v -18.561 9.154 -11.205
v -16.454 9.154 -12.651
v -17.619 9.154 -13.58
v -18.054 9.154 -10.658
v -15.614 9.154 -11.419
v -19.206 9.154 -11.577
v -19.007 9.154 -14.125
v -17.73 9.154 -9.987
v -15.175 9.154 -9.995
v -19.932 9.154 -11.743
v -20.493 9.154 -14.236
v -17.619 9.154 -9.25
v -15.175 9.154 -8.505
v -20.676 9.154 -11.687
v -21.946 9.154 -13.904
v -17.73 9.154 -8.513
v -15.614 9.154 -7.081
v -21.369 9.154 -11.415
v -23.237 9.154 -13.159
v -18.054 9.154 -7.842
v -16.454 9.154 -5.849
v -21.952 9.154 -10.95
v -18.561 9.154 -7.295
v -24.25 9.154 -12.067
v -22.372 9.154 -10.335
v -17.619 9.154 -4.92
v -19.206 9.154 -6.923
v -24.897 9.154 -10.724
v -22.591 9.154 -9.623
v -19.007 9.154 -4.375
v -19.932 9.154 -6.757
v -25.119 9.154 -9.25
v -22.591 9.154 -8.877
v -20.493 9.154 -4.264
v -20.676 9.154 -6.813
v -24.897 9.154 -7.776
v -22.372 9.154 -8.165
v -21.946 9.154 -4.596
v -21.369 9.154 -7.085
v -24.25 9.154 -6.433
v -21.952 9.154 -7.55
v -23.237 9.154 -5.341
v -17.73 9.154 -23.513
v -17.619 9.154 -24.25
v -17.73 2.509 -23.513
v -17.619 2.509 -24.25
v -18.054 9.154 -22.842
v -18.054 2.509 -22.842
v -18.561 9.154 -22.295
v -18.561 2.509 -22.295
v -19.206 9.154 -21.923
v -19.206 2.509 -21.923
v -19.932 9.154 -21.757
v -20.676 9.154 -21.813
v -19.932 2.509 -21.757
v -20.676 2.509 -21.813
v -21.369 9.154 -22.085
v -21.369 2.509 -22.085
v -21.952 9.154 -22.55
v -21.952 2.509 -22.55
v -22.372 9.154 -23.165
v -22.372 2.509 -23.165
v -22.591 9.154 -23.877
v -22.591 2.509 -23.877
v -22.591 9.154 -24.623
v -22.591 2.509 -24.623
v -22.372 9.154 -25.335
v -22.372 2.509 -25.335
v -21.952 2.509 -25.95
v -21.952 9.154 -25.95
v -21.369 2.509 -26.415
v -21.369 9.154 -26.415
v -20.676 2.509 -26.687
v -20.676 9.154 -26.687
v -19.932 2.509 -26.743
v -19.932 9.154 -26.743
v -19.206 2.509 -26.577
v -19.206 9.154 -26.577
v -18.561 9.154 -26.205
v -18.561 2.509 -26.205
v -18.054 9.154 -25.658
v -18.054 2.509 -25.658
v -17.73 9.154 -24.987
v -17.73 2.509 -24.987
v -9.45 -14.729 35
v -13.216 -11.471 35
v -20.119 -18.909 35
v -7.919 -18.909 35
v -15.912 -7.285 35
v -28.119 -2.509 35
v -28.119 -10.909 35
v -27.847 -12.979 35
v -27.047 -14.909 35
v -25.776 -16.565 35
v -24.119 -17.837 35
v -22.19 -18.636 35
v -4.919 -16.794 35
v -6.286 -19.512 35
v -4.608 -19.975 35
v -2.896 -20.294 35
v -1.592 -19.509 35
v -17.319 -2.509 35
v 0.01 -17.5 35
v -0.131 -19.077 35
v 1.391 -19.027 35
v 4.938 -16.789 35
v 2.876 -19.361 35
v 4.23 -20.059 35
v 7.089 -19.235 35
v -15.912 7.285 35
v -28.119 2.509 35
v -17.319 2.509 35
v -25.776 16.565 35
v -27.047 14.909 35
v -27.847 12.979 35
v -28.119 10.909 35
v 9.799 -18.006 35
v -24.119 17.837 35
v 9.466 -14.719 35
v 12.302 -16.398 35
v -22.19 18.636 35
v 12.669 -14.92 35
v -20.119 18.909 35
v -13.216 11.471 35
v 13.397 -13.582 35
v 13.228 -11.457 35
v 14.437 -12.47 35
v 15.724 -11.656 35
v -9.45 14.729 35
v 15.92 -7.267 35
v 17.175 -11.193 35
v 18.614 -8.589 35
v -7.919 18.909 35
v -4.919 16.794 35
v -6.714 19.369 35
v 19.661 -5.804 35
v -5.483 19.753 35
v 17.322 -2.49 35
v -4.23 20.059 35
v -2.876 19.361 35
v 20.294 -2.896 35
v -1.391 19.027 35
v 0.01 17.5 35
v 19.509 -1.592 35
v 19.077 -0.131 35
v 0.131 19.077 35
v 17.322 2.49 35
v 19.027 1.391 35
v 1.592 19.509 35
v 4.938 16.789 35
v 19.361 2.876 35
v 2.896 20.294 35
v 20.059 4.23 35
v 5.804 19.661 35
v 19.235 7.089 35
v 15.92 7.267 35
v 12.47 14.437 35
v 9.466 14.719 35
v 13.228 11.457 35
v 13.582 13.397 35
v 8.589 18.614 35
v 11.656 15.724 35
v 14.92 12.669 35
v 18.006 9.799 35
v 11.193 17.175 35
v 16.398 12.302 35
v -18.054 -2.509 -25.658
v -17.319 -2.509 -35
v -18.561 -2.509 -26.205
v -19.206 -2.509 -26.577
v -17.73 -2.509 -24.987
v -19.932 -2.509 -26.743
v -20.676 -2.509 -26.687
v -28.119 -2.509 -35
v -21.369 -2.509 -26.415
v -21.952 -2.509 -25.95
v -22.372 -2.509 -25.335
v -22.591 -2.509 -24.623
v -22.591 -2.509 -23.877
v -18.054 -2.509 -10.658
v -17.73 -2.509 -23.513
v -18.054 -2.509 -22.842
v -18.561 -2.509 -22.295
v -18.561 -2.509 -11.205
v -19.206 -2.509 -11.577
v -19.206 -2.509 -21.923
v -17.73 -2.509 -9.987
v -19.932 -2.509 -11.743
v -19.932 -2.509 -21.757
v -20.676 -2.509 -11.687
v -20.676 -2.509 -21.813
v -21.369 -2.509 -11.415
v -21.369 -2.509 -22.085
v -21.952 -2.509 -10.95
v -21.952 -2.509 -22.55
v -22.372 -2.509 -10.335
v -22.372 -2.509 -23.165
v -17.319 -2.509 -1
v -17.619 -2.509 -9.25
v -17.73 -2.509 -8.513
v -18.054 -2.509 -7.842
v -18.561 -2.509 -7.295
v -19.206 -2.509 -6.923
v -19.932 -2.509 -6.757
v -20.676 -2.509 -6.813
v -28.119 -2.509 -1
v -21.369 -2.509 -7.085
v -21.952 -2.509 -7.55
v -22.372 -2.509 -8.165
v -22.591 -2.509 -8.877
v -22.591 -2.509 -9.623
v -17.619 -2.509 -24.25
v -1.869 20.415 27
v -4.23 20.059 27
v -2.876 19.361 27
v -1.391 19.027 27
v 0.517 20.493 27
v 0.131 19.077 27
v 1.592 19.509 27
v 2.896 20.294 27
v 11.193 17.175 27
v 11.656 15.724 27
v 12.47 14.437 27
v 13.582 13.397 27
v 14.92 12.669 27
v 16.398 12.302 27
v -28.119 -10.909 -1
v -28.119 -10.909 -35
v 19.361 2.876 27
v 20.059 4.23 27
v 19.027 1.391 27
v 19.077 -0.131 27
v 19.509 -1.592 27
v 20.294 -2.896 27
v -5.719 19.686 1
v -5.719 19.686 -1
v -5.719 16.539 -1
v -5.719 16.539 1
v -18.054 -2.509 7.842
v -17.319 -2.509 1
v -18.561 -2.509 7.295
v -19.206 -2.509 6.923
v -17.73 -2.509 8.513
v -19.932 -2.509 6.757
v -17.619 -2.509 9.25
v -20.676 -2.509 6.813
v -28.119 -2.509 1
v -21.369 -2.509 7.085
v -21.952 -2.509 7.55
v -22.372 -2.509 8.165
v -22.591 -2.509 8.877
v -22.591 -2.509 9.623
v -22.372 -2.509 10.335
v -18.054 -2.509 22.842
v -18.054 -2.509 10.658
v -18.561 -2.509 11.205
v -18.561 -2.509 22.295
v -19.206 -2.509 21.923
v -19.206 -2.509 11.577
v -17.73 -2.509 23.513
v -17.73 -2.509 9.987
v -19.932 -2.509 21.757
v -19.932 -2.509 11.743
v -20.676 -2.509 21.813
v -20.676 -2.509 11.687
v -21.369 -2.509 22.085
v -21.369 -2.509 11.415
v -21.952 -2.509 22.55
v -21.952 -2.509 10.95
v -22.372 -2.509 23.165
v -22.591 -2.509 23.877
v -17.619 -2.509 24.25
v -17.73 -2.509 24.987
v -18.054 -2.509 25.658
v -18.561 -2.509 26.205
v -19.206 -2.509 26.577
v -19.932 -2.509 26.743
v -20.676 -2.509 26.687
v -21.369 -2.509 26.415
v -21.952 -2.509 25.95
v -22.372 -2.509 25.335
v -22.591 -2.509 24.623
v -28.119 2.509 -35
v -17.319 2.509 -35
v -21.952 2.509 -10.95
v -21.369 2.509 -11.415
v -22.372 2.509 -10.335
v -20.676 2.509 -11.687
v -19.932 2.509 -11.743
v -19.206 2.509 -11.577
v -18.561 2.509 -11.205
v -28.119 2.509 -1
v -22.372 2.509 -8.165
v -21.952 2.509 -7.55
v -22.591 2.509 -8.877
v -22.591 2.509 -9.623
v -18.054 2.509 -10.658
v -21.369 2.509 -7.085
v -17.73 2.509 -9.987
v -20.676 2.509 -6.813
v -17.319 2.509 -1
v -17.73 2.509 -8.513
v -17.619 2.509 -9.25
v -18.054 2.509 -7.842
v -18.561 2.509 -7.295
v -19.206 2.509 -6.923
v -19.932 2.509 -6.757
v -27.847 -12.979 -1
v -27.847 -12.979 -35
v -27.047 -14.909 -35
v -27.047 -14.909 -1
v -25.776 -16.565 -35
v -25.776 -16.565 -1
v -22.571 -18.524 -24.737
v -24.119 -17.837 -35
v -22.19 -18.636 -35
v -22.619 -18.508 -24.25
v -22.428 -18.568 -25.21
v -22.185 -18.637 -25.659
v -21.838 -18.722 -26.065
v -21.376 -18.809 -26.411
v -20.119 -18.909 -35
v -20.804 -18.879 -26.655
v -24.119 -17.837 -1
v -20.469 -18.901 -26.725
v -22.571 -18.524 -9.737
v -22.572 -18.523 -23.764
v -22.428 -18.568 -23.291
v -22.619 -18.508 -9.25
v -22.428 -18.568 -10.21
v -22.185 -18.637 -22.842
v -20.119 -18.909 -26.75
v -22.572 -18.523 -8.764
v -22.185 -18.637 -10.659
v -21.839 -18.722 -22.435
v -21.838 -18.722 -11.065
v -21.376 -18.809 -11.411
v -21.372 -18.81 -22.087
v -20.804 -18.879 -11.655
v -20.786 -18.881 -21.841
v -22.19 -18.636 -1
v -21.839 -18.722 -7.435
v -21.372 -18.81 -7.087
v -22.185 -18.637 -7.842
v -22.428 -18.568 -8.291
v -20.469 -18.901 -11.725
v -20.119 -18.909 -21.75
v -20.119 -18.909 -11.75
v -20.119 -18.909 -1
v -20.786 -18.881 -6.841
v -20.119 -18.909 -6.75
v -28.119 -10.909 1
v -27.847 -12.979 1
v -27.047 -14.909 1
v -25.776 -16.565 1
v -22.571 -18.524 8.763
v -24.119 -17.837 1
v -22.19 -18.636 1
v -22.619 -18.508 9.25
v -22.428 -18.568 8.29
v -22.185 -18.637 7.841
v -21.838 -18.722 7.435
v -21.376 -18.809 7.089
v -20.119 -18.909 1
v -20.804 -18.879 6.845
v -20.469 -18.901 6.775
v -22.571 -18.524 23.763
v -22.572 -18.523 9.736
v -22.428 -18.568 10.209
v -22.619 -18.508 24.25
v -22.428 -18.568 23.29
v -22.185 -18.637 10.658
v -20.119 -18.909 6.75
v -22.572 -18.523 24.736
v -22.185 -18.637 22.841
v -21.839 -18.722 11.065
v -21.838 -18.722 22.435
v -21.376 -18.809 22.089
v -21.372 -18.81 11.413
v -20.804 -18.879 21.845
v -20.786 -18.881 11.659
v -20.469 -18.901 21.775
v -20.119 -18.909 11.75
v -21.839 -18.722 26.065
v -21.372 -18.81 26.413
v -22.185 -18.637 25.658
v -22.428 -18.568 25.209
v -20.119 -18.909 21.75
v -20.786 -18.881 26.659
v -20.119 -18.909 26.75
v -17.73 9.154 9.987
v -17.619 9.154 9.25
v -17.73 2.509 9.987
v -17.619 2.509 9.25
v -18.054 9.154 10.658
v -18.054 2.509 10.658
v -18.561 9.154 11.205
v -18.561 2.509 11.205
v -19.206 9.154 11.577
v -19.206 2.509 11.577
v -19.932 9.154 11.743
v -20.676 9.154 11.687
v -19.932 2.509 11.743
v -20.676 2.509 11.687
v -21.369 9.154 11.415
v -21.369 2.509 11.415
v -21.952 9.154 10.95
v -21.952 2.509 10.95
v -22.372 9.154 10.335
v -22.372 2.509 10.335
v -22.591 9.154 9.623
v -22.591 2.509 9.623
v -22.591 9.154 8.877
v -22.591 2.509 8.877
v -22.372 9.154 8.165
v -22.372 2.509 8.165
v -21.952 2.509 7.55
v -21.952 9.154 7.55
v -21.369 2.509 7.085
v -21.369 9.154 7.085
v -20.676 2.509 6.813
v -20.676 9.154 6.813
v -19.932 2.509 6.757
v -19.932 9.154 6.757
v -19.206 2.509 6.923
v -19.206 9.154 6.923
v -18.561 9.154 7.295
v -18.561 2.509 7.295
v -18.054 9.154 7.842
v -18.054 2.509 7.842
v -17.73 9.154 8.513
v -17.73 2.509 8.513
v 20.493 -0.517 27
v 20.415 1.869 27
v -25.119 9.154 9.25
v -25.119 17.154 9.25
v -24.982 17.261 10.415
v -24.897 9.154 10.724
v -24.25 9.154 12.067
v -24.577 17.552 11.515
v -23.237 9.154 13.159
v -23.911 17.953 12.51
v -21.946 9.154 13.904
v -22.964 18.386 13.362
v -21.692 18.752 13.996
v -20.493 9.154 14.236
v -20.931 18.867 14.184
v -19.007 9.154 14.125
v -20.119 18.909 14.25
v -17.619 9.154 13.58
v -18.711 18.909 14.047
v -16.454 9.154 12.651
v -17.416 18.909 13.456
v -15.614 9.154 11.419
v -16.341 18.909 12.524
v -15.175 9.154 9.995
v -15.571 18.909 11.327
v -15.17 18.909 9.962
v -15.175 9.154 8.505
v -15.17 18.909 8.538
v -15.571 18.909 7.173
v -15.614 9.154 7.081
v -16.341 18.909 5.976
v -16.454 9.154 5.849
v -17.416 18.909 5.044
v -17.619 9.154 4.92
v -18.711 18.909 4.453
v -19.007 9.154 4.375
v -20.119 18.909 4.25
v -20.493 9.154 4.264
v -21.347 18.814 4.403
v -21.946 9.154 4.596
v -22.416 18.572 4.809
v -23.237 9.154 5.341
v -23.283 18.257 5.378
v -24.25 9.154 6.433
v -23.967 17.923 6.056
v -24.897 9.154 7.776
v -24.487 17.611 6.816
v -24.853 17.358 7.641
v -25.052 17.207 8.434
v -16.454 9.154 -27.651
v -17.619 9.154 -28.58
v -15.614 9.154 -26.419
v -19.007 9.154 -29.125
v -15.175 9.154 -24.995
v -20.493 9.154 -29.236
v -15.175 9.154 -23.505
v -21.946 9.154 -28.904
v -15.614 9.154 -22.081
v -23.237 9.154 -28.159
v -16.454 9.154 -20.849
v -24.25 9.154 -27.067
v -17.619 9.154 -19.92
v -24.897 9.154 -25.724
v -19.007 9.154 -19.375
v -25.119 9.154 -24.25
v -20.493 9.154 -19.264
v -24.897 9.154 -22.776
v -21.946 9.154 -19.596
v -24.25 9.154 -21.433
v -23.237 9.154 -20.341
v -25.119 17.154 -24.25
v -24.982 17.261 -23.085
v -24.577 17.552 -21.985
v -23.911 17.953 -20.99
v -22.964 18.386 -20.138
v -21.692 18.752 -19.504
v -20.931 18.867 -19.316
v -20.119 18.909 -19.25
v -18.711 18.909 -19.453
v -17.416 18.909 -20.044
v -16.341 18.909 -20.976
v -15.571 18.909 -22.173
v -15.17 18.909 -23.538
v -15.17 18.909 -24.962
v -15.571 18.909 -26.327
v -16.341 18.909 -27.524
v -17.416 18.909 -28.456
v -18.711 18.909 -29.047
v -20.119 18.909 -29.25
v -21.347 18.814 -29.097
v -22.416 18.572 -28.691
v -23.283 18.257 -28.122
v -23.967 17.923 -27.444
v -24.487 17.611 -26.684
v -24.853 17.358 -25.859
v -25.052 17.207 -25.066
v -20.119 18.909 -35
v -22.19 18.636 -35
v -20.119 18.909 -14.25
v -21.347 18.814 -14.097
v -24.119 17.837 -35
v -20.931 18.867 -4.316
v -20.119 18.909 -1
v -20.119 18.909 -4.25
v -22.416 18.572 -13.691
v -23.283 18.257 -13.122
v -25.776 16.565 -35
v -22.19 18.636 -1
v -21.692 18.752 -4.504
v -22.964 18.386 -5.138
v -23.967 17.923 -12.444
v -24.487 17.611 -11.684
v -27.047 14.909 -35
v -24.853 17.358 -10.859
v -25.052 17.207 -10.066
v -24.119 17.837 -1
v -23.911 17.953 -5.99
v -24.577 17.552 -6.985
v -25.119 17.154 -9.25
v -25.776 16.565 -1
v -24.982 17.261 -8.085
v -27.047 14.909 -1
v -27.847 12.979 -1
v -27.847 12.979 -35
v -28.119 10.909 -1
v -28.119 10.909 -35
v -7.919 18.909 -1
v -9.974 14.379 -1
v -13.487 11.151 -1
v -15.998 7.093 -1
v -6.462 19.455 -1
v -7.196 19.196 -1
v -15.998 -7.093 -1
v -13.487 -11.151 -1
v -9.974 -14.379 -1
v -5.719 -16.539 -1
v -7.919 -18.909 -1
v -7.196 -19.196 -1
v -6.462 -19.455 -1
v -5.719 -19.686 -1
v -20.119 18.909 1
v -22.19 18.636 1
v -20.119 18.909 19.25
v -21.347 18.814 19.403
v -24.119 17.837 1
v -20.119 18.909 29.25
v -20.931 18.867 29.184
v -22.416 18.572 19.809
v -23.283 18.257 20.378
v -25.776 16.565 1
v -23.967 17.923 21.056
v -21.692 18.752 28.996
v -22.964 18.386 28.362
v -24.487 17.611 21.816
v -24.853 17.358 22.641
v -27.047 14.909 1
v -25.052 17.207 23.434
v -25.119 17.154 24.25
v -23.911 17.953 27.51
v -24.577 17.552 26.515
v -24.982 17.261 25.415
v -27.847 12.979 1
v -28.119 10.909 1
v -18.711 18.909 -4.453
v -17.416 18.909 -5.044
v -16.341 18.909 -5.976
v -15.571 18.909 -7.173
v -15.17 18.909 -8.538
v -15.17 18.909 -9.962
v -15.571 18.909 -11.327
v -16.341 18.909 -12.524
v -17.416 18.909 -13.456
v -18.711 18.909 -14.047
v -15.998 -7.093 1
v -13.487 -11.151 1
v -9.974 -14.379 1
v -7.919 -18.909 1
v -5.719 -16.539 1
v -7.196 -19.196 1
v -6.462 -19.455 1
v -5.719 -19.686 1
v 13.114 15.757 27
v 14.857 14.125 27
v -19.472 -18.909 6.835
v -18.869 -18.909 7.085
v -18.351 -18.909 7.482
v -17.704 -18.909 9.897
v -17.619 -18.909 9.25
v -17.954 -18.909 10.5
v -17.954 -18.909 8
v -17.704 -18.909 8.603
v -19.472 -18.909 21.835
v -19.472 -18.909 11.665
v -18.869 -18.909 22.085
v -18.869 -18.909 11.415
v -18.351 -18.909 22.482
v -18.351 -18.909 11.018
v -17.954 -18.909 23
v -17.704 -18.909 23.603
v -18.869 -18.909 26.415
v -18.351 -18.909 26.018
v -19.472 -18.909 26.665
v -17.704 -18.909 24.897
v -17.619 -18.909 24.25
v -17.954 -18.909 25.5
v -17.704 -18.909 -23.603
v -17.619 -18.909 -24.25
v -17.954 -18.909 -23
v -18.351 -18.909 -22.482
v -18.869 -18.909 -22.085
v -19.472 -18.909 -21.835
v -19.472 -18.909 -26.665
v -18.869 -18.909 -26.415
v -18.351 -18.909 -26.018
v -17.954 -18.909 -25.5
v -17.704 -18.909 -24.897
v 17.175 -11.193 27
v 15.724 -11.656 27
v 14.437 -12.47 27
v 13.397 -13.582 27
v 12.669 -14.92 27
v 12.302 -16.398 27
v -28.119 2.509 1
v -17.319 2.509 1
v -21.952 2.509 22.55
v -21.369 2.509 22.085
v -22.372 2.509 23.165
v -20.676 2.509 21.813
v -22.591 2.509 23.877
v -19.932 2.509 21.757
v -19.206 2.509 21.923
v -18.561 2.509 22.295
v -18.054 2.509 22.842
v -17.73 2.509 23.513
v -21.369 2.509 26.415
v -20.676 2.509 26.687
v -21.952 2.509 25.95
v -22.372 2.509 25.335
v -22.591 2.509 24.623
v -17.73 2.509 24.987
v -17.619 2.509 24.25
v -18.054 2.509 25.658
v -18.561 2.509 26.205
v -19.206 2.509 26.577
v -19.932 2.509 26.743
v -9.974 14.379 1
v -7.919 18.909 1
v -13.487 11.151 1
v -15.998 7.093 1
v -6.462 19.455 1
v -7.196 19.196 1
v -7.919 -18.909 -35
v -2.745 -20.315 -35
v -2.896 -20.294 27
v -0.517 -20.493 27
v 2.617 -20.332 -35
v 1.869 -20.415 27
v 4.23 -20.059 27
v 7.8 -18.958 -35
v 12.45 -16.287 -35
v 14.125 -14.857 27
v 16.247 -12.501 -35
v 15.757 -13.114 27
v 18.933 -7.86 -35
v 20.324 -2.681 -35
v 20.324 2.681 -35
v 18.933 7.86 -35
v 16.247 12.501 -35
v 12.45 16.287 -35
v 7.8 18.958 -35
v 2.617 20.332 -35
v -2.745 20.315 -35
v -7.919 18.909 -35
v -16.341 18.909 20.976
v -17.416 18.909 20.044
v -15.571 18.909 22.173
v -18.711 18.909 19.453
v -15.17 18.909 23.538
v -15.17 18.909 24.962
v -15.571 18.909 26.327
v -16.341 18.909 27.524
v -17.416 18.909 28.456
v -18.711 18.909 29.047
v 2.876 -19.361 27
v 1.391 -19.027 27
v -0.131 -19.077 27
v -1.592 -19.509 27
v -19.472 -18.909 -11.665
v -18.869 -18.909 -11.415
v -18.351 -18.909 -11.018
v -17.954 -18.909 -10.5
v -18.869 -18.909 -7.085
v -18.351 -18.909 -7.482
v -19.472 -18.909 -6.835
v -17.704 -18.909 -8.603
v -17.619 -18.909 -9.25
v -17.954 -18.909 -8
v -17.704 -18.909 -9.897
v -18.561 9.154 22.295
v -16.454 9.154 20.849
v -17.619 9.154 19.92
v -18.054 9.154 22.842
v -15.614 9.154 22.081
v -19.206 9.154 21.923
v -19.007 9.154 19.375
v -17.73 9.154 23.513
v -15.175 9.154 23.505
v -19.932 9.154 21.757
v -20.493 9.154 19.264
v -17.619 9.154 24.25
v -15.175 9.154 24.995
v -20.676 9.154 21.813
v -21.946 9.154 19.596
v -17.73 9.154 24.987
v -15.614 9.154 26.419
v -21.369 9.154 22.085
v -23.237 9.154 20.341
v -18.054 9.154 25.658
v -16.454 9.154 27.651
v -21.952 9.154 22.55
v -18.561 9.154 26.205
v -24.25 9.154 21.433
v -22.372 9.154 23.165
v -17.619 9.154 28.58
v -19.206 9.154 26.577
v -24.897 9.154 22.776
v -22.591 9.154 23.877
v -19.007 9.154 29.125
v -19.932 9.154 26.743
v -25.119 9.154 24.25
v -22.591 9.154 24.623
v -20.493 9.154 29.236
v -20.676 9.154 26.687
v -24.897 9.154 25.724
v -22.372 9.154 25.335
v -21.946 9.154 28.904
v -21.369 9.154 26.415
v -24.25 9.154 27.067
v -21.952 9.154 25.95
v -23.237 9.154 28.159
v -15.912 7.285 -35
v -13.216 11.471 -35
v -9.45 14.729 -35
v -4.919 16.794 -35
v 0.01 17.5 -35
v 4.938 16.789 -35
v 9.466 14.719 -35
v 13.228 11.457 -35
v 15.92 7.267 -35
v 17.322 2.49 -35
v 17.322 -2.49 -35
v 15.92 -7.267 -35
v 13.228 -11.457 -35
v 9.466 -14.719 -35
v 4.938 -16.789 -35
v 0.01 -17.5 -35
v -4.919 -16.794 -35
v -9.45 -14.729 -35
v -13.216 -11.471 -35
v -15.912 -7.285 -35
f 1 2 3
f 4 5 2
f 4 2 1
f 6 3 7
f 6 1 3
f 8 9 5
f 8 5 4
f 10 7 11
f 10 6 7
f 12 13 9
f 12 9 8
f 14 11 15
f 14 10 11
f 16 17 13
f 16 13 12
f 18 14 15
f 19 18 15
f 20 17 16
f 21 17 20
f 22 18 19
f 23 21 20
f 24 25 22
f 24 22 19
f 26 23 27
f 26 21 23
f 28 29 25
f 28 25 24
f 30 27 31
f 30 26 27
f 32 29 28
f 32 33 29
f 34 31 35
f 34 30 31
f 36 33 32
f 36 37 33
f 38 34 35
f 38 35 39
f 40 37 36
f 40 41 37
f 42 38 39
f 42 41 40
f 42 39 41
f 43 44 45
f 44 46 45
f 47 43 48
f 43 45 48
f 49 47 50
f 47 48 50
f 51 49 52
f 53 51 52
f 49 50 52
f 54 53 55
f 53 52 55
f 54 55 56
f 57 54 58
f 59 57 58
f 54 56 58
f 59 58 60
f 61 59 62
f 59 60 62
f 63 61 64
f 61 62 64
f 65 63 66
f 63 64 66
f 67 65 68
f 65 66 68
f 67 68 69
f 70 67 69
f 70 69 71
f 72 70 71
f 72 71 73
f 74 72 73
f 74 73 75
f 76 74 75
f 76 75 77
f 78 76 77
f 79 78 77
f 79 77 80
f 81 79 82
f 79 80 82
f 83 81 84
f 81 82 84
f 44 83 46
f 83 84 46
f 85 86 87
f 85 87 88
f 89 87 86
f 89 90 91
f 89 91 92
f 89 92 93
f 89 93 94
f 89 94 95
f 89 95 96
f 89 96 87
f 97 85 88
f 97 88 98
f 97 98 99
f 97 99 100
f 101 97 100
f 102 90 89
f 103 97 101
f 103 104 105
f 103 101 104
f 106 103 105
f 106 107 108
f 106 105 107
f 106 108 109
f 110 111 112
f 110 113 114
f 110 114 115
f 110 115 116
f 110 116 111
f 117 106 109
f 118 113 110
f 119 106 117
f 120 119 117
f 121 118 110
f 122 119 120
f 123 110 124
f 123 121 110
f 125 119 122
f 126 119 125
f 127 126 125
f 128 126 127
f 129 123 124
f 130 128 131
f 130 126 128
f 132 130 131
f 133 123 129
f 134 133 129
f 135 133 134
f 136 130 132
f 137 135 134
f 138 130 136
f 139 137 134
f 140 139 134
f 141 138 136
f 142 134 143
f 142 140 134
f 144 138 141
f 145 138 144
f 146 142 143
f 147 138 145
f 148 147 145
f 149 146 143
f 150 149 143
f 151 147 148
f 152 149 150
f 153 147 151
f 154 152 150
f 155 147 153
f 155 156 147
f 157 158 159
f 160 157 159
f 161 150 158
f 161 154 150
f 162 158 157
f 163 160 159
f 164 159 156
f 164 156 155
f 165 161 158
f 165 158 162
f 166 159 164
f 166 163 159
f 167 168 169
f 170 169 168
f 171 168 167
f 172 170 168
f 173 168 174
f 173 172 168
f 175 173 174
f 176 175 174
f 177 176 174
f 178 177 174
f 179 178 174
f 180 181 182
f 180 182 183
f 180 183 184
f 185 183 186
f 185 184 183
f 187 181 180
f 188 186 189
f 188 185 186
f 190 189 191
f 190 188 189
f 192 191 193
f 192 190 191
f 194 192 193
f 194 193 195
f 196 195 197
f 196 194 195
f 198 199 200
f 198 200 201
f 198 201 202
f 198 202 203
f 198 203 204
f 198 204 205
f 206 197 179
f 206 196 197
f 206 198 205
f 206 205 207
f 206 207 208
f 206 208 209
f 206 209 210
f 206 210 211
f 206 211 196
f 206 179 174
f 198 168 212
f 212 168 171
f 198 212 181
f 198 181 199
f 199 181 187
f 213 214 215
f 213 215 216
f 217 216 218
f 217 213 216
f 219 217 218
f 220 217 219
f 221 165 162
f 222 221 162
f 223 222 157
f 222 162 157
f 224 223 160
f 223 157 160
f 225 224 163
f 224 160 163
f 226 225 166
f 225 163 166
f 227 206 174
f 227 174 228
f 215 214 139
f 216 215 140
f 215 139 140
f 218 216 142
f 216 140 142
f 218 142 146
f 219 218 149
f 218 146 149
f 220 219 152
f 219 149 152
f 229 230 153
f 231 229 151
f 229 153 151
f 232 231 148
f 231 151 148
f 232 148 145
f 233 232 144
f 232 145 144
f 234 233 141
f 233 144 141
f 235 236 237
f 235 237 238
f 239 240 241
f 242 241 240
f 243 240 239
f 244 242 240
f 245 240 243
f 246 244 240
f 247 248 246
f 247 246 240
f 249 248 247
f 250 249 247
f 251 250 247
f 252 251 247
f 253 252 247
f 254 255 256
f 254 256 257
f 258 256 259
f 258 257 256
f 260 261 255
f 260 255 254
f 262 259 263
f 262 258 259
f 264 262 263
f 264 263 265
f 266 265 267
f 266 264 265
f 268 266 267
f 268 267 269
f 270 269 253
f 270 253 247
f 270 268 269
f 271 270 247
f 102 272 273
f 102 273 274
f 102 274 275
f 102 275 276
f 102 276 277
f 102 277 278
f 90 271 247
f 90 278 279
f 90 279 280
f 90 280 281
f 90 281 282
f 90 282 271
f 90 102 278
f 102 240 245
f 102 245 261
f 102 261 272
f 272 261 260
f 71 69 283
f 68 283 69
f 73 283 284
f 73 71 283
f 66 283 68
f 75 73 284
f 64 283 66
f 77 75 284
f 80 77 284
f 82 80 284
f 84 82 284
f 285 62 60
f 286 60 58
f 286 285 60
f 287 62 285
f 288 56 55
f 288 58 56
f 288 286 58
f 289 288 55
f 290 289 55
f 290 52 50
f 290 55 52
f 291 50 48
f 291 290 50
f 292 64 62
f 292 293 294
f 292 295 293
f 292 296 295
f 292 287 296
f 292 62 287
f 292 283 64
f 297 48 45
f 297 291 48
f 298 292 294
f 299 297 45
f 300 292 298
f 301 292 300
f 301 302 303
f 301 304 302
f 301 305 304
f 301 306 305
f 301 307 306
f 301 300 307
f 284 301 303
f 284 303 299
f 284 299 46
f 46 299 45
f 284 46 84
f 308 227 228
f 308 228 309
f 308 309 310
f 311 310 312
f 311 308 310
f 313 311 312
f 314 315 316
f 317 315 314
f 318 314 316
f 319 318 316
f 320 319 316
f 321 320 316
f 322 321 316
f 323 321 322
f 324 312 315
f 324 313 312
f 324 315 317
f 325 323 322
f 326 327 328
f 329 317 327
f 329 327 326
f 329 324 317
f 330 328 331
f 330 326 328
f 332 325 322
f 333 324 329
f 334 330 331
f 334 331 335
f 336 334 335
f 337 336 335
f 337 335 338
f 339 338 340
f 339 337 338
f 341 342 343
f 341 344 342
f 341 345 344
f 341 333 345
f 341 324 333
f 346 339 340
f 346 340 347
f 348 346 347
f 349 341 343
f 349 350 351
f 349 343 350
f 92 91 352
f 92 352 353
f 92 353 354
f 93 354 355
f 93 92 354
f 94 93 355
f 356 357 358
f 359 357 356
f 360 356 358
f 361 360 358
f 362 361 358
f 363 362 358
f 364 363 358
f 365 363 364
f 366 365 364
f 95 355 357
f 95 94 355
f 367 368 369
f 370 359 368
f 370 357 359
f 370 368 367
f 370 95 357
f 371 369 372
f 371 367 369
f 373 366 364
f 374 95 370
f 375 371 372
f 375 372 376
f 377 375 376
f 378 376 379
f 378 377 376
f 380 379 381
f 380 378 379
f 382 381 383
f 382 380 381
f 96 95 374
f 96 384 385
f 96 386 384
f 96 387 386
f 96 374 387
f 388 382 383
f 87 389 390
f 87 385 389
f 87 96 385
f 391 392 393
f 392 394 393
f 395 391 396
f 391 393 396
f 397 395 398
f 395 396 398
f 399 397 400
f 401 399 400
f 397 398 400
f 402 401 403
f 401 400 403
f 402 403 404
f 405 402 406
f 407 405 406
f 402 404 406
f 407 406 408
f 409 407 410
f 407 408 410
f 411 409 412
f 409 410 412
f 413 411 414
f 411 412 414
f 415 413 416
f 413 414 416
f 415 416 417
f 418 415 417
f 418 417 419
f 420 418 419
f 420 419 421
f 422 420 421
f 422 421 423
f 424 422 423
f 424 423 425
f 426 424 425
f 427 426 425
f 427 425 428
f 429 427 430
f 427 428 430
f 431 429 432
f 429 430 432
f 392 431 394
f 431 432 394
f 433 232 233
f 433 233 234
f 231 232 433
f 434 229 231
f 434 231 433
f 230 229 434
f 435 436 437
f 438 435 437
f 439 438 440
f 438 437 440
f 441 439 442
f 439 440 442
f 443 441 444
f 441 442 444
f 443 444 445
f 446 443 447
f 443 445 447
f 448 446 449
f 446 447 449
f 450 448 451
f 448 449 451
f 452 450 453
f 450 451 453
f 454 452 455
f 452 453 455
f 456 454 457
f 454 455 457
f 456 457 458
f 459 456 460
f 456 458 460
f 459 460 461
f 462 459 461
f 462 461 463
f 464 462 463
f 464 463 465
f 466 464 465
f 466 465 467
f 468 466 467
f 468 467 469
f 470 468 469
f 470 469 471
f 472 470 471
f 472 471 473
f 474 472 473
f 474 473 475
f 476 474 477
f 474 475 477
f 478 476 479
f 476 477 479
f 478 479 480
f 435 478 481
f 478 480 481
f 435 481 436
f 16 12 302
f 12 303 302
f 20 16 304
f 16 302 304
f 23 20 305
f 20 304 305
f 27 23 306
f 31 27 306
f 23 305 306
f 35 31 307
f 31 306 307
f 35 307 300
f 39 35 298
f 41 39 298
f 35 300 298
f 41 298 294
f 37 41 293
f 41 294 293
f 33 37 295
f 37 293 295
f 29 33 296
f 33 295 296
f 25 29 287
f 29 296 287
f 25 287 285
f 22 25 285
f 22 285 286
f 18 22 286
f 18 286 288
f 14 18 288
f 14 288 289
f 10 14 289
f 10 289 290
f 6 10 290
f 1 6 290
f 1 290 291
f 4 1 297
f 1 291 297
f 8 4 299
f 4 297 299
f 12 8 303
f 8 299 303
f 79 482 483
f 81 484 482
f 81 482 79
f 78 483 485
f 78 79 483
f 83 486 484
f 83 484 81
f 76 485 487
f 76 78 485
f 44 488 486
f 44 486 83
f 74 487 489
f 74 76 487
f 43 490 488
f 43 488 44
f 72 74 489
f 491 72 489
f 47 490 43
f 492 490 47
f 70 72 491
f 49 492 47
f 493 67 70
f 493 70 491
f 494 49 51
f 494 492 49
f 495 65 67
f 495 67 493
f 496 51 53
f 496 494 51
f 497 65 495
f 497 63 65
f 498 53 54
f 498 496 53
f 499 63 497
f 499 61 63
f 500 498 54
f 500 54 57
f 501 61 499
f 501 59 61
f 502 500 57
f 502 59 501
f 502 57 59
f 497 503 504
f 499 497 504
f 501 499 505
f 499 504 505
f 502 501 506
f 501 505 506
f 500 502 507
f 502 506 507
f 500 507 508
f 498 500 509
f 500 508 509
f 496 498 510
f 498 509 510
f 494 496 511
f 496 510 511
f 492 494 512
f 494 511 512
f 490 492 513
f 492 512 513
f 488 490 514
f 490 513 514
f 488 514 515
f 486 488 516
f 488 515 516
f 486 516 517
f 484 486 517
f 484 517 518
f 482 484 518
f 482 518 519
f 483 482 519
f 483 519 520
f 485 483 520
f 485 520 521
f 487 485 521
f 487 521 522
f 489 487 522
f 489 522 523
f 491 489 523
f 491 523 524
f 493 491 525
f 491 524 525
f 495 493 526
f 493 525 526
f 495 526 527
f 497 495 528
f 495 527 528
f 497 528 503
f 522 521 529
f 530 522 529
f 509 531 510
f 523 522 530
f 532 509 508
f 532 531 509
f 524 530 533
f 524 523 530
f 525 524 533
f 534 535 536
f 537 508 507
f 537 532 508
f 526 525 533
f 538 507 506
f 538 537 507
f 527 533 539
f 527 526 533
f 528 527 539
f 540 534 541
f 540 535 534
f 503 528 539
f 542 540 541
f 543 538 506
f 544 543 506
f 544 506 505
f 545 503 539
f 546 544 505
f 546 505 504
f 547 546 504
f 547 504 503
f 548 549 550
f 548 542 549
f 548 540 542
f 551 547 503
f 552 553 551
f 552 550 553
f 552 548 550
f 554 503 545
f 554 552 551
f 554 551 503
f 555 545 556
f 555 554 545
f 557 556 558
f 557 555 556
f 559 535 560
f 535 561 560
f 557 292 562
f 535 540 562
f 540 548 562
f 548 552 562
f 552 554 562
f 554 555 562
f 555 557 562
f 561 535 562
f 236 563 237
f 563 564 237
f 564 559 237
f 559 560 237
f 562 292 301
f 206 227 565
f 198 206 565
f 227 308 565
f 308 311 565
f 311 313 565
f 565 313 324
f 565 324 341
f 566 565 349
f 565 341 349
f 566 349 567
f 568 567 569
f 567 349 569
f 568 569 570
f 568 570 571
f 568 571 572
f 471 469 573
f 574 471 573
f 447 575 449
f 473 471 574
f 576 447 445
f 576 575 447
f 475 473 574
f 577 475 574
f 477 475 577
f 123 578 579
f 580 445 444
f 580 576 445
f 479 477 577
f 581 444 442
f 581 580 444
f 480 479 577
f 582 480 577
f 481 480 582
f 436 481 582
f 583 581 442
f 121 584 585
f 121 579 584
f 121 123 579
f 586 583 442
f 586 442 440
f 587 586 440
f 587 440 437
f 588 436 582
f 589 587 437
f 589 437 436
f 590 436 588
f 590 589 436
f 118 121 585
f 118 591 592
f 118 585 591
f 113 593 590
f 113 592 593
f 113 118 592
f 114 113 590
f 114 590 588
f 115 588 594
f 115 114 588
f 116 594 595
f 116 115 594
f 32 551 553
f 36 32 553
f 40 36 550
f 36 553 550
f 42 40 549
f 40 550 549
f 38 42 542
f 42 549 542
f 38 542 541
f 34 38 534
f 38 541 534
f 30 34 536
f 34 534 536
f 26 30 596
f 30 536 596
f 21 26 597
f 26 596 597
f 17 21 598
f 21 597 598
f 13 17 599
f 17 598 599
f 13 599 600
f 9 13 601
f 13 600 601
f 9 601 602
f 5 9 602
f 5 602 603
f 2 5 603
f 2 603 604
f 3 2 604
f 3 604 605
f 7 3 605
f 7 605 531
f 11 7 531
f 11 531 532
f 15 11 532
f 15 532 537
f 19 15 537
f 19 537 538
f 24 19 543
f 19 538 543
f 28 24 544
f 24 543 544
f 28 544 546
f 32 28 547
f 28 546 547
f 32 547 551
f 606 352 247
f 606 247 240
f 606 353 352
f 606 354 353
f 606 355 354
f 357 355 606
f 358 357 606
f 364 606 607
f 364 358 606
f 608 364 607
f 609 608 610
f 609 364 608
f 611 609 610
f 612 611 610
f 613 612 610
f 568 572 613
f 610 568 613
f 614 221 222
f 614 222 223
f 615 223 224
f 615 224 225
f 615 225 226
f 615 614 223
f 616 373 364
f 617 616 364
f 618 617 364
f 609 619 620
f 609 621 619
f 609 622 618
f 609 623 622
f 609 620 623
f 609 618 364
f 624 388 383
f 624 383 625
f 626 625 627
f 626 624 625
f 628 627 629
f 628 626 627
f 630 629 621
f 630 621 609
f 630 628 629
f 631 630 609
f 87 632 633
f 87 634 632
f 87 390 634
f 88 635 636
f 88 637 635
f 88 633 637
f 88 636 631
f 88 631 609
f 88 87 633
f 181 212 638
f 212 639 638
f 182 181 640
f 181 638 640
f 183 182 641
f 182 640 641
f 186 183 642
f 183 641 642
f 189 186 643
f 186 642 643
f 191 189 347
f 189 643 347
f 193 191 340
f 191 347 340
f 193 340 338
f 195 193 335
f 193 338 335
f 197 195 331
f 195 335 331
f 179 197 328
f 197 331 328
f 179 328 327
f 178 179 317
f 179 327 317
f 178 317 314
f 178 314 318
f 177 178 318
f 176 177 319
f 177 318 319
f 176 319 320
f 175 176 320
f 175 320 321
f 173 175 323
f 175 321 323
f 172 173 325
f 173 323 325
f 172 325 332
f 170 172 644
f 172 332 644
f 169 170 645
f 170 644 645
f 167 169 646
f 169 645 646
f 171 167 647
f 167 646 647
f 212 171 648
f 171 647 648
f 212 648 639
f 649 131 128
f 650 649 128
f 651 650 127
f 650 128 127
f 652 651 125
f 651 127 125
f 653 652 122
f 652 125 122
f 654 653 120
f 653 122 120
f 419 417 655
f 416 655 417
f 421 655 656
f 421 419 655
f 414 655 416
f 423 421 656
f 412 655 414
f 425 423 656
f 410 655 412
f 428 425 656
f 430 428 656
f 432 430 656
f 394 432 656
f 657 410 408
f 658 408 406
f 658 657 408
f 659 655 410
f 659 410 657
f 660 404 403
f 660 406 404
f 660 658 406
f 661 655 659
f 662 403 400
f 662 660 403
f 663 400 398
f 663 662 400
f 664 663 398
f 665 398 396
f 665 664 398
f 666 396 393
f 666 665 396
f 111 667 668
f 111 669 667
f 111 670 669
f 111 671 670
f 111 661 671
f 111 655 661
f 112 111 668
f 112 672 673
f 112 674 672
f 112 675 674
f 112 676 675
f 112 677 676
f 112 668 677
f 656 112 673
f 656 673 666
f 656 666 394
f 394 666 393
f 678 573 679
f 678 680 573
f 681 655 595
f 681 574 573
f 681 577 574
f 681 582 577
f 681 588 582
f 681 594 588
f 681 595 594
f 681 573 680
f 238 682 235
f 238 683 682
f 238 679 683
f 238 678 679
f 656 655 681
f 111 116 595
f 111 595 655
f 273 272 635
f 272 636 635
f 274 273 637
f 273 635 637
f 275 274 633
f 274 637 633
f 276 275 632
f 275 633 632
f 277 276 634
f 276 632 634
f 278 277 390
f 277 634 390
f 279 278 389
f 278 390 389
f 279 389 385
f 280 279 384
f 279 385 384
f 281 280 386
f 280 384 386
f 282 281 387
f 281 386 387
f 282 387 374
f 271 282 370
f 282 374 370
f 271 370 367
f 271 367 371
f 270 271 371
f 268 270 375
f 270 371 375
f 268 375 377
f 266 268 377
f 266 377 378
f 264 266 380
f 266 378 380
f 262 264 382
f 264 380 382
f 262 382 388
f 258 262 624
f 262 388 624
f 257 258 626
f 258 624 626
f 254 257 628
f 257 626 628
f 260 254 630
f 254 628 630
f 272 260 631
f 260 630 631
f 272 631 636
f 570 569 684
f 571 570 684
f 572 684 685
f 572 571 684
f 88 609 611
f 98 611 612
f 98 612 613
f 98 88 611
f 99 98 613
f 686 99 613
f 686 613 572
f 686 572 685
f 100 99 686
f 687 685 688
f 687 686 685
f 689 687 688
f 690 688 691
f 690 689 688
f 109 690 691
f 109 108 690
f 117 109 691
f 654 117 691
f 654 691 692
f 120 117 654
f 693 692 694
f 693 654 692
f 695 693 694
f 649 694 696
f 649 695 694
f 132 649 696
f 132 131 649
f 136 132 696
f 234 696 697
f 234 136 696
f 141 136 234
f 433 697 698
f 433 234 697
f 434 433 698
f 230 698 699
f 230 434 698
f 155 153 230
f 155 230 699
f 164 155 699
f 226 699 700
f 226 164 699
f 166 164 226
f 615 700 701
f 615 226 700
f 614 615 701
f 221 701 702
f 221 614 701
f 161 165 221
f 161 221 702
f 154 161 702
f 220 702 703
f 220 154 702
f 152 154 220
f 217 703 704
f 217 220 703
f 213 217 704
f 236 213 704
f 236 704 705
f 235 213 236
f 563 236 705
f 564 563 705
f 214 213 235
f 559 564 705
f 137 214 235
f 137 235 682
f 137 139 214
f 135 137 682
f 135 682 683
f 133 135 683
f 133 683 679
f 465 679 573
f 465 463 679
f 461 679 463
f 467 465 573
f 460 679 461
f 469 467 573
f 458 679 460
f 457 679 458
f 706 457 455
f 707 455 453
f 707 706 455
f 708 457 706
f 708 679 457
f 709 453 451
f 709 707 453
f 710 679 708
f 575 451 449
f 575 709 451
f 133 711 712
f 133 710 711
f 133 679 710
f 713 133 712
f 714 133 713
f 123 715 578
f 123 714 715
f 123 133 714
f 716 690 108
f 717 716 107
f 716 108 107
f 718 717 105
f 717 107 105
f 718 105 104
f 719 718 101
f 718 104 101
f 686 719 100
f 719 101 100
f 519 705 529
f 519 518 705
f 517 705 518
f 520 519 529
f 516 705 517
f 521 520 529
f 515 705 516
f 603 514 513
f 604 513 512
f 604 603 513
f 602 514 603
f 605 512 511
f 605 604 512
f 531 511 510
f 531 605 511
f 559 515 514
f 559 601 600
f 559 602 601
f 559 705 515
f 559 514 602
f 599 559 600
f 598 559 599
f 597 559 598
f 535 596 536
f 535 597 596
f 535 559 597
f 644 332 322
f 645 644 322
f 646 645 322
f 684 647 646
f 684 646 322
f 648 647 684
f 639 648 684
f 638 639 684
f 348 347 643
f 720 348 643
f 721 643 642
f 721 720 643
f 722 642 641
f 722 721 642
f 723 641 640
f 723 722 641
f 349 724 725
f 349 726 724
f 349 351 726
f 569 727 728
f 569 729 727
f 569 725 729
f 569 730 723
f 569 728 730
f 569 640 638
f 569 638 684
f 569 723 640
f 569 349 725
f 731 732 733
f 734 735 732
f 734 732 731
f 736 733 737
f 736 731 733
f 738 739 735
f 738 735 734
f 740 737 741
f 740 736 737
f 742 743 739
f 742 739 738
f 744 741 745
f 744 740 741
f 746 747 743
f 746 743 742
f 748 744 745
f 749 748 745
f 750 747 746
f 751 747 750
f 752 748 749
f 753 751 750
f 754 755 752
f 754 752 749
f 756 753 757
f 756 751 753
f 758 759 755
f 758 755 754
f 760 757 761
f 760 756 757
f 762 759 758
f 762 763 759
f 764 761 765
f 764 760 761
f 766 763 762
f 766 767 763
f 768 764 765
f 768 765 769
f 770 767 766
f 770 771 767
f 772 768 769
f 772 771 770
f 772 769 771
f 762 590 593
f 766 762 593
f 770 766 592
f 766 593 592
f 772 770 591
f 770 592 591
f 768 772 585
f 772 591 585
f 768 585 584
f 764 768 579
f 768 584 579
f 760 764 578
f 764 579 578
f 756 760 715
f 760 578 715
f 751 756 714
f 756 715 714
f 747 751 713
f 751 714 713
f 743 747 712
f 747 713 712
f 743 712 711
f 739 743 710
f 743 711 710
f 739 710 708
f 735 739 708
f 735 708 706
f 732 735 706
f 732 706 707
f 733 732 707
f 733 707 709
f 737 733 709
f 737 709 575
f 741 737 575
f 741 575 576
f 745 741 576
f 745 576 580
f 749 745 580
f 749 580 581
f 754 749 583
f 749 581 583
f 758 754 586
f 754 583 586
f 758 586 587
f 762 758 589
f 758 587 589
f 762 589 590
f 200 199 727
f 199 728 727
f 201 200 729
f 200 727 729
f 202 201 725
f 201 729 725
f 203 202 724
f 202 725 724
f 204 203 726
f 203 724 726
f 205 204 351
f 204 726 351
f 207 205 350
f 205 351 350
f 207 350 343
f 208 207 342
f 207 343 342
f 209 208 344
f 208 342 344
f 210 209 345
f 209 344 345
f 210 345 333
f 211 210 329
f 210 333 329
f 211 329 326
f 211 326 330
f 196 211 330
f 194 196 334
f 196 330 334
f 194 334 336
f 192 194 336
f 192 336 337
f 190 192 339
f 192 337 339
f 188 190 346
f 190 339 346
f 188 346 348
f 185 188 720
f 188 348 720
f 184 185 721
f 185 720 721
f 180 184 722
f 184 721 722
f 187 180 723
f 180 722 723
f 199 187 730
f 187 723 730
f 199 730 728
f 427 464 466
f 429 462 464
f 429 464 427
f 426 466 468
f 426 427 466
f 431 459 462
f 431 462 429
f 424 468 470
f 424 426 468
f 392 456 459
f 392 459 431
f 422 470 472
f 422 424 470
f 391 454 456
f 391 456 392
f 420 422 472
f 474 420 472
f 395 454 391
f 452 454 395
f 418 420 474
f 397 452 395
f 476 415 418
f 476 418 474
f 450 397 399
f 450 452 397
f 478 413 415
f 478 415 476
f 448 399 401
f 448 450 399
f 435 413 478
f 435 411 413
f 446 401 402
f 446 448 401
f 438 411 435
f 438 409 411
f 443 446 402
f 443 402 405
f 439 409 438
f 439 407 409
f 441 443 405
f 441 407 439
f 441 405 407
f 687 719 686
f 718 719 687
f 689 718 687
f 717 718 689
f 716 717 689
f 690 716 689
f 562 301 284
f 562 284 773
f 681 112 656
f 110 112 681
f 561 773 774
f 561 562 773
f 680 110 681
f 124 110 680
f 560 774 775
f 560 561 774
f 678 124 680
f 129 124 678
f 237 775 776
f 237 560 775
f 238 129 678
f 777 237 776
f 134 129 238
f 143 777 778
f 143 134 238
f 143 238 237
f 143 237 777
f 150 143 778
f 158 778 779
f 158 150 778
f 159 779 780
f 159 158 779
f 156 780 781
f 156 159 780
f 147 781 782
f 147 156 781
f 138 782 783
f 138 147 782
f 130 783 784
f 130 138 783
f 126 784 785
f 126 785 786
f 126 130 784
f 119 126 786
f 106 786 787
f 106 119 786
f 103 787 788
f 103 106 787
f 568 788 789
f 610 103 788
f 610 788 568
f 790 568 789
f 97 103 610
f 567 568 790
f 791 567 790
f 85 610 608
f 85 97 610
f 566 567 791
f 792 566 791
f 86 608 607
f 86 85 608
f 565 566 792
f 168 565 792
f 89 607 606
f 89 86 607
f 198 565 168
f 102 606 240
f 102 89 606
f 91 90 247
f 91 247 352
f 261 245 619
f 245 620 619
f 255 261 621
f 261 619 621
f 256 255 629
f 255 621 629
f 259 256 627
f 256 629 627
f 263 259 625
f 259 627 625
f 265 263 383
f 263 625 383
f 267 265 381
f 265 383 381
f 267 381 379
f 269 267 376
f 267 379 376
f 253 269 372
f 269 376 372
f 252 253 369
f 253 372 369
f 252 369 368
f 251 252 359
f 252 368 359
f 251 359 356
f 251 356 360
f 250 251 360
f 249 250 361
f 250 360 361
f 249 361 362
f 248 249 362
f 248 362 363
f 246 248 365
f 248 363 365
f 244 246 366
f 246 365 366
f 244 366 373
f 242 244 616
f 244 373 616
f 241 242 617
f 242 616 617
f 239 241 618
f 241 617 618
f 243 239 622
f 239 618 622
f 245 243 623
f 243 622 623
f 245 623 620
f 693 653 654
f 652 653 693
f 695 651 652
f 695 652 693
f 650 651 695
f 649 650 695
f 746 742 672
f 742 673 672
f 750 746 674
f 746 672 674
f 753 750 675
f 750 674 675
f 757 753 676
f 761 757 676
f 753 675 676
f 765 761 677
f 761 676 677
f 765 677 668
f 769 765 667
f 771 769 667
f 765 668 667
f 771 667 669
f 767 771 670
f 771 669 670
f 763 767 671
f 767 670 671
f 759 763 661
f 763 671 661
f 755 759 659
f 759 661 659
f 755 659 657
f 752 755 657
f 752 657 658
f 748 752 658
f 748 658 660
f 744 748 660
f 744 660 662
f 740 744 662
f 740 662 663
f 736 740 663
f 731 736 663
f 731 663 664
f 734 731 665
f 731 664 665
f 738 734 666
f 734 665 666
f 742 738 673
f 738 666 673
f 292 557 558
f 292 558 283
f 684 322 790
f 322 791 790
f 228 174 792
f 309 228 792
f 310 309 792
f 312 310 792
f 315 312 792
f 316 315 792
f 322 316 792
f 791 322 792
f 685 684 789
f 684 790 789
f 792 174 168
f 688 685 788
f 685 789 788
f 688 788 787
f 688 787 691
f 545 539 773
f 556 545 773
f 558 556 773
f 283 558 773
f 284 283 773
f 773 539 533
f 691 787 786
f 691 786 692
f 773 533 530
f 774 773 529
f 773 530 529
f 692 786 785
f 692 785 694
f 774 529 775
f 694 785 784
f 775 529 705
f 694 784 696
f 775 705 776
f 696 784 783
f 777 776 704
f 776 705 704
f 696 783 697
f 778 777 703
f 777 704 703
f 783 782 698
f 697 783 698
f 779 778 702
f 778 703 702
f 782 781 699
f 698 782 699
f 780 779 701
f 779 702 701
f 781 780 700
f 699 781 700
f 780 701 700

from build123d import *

# Parameters (mm, degrees)
F1_DEPTH       = 35
F3_D           = 5
F3_START       = 1.7550021
F3_CBORE_D     = 10
F3_CBORE_DEPTH = 8
F4_W           = 22.4
F4_H           = 2
F5_DEPTH       = 25
F6_R           = 6
F7_DEPTH       = 8


with BuildPart() as f1:
    # F0 (on Top) → F1 (new body, symmetric)
    with BuildSketch(Plane.XY):
        with BuildLine():
            ThreePointArc((-17.3192642082, 2.5086026559), (17.5, 0), (-17.3192642082, -2.5086026559))
            Line((-17.3192642082, -2.5086026559), (-20.3459311096, -2.5086026559))
            ThreePointArc((-20.3459311096, -2.5086026559), (-16.3392263155, -12.3806172468), (-7.9192642082, -18.9086026559))
            ThreePointArc((-7.9192642082, -18.9086026559), (20.5, 0), (-7.9192642082, 18.9086026559))
            Line((-7.9192642082, 18.9086026559), (-20.1192642082, 18.9086026559))
            ThreePointArc((-20.1192642082, 18.9086026559), (-25.7761184577, 16.5654569054), (-28.1192642082, 10.9086026559))
            Line((-28.1192642082, 10.9086026559), (-28.1192642082, 2.5086026559))
            Line((-28.1192642082, 2.5086026559), (-17.3192642082, 2.5086026559))
        make_face()
        with BuildLine():
            ThreePointArc((-7.9192642082, -18.9086026559), (-16.3392263155, -12.3806172468), (-20.3459311096, -2.5086026559))
            Line((-20.3459311096, -2.5086026559), (-28.1192642082, -2.5086026559))
            Line((-28.1192642082, -2.5086026559), (-28.1192642082, -10.9086026559))
            ThreePointArc((-28.1192642082, -10.9086026559), (-25.7761184577, -16.5654569054), (-20.1192642082, -18.9086026559))
            Line((-20.1192642082, -18.9086026559), (-7.9192642082, -18.9086026559))
        make_face()
    extrude(amount=F1_DEPTH, both=True)

    # F3 (through all)
    # its depths count from where the whole tool has entered the part; down to there all is cleared
    with Locations(Plane(origin=(0, 18.9086026559, 0), x_dir=(-1, 0, 0), z_dir=(0, 1, 0)).offset(-F3_START)):
        with Locations((20.1192642082, 24.25), (20.1192642082, 9.25), (20.1192642082, -9.25), (20.1192642082, -24.25)):
            CounterBoreHole(F3_D / 2, F3_CBORE_D / 2, F3_CBORE_DEPTH)

    # F4 (on Front) → F5 (cut, symmetric)
    with BuildSketch(Plane.XZ):
        with Locations((-16.9192642082, 0)):
            Rectangle(F4_W, F4_H)
    extrude(amount=F5_DEPTH, both=True, mode=Mode.SUBTRACT)

    # F6 (on face) → F7 (cut)
    with BuildSketch(Plane.XY.offset(35)):
        with Locations((0.8263058844, -25)):
            Circle(F6_R)
        with Locations((18.2619560239, -17.0933830355)):
            Circle(F6_R)
        with Locations((25, 0.8263058844)):
            Circle(F6_R)
        with Locations((17.0933830355, 18.2619560239)):
            Circle(F6_R)
        with Locations((-0.8263058844, 25)):
            Circle(F6_R)
    extrude(amount=-F7_DEPTH, mode=Mode.SUBTRACT)


solid = f1.part
